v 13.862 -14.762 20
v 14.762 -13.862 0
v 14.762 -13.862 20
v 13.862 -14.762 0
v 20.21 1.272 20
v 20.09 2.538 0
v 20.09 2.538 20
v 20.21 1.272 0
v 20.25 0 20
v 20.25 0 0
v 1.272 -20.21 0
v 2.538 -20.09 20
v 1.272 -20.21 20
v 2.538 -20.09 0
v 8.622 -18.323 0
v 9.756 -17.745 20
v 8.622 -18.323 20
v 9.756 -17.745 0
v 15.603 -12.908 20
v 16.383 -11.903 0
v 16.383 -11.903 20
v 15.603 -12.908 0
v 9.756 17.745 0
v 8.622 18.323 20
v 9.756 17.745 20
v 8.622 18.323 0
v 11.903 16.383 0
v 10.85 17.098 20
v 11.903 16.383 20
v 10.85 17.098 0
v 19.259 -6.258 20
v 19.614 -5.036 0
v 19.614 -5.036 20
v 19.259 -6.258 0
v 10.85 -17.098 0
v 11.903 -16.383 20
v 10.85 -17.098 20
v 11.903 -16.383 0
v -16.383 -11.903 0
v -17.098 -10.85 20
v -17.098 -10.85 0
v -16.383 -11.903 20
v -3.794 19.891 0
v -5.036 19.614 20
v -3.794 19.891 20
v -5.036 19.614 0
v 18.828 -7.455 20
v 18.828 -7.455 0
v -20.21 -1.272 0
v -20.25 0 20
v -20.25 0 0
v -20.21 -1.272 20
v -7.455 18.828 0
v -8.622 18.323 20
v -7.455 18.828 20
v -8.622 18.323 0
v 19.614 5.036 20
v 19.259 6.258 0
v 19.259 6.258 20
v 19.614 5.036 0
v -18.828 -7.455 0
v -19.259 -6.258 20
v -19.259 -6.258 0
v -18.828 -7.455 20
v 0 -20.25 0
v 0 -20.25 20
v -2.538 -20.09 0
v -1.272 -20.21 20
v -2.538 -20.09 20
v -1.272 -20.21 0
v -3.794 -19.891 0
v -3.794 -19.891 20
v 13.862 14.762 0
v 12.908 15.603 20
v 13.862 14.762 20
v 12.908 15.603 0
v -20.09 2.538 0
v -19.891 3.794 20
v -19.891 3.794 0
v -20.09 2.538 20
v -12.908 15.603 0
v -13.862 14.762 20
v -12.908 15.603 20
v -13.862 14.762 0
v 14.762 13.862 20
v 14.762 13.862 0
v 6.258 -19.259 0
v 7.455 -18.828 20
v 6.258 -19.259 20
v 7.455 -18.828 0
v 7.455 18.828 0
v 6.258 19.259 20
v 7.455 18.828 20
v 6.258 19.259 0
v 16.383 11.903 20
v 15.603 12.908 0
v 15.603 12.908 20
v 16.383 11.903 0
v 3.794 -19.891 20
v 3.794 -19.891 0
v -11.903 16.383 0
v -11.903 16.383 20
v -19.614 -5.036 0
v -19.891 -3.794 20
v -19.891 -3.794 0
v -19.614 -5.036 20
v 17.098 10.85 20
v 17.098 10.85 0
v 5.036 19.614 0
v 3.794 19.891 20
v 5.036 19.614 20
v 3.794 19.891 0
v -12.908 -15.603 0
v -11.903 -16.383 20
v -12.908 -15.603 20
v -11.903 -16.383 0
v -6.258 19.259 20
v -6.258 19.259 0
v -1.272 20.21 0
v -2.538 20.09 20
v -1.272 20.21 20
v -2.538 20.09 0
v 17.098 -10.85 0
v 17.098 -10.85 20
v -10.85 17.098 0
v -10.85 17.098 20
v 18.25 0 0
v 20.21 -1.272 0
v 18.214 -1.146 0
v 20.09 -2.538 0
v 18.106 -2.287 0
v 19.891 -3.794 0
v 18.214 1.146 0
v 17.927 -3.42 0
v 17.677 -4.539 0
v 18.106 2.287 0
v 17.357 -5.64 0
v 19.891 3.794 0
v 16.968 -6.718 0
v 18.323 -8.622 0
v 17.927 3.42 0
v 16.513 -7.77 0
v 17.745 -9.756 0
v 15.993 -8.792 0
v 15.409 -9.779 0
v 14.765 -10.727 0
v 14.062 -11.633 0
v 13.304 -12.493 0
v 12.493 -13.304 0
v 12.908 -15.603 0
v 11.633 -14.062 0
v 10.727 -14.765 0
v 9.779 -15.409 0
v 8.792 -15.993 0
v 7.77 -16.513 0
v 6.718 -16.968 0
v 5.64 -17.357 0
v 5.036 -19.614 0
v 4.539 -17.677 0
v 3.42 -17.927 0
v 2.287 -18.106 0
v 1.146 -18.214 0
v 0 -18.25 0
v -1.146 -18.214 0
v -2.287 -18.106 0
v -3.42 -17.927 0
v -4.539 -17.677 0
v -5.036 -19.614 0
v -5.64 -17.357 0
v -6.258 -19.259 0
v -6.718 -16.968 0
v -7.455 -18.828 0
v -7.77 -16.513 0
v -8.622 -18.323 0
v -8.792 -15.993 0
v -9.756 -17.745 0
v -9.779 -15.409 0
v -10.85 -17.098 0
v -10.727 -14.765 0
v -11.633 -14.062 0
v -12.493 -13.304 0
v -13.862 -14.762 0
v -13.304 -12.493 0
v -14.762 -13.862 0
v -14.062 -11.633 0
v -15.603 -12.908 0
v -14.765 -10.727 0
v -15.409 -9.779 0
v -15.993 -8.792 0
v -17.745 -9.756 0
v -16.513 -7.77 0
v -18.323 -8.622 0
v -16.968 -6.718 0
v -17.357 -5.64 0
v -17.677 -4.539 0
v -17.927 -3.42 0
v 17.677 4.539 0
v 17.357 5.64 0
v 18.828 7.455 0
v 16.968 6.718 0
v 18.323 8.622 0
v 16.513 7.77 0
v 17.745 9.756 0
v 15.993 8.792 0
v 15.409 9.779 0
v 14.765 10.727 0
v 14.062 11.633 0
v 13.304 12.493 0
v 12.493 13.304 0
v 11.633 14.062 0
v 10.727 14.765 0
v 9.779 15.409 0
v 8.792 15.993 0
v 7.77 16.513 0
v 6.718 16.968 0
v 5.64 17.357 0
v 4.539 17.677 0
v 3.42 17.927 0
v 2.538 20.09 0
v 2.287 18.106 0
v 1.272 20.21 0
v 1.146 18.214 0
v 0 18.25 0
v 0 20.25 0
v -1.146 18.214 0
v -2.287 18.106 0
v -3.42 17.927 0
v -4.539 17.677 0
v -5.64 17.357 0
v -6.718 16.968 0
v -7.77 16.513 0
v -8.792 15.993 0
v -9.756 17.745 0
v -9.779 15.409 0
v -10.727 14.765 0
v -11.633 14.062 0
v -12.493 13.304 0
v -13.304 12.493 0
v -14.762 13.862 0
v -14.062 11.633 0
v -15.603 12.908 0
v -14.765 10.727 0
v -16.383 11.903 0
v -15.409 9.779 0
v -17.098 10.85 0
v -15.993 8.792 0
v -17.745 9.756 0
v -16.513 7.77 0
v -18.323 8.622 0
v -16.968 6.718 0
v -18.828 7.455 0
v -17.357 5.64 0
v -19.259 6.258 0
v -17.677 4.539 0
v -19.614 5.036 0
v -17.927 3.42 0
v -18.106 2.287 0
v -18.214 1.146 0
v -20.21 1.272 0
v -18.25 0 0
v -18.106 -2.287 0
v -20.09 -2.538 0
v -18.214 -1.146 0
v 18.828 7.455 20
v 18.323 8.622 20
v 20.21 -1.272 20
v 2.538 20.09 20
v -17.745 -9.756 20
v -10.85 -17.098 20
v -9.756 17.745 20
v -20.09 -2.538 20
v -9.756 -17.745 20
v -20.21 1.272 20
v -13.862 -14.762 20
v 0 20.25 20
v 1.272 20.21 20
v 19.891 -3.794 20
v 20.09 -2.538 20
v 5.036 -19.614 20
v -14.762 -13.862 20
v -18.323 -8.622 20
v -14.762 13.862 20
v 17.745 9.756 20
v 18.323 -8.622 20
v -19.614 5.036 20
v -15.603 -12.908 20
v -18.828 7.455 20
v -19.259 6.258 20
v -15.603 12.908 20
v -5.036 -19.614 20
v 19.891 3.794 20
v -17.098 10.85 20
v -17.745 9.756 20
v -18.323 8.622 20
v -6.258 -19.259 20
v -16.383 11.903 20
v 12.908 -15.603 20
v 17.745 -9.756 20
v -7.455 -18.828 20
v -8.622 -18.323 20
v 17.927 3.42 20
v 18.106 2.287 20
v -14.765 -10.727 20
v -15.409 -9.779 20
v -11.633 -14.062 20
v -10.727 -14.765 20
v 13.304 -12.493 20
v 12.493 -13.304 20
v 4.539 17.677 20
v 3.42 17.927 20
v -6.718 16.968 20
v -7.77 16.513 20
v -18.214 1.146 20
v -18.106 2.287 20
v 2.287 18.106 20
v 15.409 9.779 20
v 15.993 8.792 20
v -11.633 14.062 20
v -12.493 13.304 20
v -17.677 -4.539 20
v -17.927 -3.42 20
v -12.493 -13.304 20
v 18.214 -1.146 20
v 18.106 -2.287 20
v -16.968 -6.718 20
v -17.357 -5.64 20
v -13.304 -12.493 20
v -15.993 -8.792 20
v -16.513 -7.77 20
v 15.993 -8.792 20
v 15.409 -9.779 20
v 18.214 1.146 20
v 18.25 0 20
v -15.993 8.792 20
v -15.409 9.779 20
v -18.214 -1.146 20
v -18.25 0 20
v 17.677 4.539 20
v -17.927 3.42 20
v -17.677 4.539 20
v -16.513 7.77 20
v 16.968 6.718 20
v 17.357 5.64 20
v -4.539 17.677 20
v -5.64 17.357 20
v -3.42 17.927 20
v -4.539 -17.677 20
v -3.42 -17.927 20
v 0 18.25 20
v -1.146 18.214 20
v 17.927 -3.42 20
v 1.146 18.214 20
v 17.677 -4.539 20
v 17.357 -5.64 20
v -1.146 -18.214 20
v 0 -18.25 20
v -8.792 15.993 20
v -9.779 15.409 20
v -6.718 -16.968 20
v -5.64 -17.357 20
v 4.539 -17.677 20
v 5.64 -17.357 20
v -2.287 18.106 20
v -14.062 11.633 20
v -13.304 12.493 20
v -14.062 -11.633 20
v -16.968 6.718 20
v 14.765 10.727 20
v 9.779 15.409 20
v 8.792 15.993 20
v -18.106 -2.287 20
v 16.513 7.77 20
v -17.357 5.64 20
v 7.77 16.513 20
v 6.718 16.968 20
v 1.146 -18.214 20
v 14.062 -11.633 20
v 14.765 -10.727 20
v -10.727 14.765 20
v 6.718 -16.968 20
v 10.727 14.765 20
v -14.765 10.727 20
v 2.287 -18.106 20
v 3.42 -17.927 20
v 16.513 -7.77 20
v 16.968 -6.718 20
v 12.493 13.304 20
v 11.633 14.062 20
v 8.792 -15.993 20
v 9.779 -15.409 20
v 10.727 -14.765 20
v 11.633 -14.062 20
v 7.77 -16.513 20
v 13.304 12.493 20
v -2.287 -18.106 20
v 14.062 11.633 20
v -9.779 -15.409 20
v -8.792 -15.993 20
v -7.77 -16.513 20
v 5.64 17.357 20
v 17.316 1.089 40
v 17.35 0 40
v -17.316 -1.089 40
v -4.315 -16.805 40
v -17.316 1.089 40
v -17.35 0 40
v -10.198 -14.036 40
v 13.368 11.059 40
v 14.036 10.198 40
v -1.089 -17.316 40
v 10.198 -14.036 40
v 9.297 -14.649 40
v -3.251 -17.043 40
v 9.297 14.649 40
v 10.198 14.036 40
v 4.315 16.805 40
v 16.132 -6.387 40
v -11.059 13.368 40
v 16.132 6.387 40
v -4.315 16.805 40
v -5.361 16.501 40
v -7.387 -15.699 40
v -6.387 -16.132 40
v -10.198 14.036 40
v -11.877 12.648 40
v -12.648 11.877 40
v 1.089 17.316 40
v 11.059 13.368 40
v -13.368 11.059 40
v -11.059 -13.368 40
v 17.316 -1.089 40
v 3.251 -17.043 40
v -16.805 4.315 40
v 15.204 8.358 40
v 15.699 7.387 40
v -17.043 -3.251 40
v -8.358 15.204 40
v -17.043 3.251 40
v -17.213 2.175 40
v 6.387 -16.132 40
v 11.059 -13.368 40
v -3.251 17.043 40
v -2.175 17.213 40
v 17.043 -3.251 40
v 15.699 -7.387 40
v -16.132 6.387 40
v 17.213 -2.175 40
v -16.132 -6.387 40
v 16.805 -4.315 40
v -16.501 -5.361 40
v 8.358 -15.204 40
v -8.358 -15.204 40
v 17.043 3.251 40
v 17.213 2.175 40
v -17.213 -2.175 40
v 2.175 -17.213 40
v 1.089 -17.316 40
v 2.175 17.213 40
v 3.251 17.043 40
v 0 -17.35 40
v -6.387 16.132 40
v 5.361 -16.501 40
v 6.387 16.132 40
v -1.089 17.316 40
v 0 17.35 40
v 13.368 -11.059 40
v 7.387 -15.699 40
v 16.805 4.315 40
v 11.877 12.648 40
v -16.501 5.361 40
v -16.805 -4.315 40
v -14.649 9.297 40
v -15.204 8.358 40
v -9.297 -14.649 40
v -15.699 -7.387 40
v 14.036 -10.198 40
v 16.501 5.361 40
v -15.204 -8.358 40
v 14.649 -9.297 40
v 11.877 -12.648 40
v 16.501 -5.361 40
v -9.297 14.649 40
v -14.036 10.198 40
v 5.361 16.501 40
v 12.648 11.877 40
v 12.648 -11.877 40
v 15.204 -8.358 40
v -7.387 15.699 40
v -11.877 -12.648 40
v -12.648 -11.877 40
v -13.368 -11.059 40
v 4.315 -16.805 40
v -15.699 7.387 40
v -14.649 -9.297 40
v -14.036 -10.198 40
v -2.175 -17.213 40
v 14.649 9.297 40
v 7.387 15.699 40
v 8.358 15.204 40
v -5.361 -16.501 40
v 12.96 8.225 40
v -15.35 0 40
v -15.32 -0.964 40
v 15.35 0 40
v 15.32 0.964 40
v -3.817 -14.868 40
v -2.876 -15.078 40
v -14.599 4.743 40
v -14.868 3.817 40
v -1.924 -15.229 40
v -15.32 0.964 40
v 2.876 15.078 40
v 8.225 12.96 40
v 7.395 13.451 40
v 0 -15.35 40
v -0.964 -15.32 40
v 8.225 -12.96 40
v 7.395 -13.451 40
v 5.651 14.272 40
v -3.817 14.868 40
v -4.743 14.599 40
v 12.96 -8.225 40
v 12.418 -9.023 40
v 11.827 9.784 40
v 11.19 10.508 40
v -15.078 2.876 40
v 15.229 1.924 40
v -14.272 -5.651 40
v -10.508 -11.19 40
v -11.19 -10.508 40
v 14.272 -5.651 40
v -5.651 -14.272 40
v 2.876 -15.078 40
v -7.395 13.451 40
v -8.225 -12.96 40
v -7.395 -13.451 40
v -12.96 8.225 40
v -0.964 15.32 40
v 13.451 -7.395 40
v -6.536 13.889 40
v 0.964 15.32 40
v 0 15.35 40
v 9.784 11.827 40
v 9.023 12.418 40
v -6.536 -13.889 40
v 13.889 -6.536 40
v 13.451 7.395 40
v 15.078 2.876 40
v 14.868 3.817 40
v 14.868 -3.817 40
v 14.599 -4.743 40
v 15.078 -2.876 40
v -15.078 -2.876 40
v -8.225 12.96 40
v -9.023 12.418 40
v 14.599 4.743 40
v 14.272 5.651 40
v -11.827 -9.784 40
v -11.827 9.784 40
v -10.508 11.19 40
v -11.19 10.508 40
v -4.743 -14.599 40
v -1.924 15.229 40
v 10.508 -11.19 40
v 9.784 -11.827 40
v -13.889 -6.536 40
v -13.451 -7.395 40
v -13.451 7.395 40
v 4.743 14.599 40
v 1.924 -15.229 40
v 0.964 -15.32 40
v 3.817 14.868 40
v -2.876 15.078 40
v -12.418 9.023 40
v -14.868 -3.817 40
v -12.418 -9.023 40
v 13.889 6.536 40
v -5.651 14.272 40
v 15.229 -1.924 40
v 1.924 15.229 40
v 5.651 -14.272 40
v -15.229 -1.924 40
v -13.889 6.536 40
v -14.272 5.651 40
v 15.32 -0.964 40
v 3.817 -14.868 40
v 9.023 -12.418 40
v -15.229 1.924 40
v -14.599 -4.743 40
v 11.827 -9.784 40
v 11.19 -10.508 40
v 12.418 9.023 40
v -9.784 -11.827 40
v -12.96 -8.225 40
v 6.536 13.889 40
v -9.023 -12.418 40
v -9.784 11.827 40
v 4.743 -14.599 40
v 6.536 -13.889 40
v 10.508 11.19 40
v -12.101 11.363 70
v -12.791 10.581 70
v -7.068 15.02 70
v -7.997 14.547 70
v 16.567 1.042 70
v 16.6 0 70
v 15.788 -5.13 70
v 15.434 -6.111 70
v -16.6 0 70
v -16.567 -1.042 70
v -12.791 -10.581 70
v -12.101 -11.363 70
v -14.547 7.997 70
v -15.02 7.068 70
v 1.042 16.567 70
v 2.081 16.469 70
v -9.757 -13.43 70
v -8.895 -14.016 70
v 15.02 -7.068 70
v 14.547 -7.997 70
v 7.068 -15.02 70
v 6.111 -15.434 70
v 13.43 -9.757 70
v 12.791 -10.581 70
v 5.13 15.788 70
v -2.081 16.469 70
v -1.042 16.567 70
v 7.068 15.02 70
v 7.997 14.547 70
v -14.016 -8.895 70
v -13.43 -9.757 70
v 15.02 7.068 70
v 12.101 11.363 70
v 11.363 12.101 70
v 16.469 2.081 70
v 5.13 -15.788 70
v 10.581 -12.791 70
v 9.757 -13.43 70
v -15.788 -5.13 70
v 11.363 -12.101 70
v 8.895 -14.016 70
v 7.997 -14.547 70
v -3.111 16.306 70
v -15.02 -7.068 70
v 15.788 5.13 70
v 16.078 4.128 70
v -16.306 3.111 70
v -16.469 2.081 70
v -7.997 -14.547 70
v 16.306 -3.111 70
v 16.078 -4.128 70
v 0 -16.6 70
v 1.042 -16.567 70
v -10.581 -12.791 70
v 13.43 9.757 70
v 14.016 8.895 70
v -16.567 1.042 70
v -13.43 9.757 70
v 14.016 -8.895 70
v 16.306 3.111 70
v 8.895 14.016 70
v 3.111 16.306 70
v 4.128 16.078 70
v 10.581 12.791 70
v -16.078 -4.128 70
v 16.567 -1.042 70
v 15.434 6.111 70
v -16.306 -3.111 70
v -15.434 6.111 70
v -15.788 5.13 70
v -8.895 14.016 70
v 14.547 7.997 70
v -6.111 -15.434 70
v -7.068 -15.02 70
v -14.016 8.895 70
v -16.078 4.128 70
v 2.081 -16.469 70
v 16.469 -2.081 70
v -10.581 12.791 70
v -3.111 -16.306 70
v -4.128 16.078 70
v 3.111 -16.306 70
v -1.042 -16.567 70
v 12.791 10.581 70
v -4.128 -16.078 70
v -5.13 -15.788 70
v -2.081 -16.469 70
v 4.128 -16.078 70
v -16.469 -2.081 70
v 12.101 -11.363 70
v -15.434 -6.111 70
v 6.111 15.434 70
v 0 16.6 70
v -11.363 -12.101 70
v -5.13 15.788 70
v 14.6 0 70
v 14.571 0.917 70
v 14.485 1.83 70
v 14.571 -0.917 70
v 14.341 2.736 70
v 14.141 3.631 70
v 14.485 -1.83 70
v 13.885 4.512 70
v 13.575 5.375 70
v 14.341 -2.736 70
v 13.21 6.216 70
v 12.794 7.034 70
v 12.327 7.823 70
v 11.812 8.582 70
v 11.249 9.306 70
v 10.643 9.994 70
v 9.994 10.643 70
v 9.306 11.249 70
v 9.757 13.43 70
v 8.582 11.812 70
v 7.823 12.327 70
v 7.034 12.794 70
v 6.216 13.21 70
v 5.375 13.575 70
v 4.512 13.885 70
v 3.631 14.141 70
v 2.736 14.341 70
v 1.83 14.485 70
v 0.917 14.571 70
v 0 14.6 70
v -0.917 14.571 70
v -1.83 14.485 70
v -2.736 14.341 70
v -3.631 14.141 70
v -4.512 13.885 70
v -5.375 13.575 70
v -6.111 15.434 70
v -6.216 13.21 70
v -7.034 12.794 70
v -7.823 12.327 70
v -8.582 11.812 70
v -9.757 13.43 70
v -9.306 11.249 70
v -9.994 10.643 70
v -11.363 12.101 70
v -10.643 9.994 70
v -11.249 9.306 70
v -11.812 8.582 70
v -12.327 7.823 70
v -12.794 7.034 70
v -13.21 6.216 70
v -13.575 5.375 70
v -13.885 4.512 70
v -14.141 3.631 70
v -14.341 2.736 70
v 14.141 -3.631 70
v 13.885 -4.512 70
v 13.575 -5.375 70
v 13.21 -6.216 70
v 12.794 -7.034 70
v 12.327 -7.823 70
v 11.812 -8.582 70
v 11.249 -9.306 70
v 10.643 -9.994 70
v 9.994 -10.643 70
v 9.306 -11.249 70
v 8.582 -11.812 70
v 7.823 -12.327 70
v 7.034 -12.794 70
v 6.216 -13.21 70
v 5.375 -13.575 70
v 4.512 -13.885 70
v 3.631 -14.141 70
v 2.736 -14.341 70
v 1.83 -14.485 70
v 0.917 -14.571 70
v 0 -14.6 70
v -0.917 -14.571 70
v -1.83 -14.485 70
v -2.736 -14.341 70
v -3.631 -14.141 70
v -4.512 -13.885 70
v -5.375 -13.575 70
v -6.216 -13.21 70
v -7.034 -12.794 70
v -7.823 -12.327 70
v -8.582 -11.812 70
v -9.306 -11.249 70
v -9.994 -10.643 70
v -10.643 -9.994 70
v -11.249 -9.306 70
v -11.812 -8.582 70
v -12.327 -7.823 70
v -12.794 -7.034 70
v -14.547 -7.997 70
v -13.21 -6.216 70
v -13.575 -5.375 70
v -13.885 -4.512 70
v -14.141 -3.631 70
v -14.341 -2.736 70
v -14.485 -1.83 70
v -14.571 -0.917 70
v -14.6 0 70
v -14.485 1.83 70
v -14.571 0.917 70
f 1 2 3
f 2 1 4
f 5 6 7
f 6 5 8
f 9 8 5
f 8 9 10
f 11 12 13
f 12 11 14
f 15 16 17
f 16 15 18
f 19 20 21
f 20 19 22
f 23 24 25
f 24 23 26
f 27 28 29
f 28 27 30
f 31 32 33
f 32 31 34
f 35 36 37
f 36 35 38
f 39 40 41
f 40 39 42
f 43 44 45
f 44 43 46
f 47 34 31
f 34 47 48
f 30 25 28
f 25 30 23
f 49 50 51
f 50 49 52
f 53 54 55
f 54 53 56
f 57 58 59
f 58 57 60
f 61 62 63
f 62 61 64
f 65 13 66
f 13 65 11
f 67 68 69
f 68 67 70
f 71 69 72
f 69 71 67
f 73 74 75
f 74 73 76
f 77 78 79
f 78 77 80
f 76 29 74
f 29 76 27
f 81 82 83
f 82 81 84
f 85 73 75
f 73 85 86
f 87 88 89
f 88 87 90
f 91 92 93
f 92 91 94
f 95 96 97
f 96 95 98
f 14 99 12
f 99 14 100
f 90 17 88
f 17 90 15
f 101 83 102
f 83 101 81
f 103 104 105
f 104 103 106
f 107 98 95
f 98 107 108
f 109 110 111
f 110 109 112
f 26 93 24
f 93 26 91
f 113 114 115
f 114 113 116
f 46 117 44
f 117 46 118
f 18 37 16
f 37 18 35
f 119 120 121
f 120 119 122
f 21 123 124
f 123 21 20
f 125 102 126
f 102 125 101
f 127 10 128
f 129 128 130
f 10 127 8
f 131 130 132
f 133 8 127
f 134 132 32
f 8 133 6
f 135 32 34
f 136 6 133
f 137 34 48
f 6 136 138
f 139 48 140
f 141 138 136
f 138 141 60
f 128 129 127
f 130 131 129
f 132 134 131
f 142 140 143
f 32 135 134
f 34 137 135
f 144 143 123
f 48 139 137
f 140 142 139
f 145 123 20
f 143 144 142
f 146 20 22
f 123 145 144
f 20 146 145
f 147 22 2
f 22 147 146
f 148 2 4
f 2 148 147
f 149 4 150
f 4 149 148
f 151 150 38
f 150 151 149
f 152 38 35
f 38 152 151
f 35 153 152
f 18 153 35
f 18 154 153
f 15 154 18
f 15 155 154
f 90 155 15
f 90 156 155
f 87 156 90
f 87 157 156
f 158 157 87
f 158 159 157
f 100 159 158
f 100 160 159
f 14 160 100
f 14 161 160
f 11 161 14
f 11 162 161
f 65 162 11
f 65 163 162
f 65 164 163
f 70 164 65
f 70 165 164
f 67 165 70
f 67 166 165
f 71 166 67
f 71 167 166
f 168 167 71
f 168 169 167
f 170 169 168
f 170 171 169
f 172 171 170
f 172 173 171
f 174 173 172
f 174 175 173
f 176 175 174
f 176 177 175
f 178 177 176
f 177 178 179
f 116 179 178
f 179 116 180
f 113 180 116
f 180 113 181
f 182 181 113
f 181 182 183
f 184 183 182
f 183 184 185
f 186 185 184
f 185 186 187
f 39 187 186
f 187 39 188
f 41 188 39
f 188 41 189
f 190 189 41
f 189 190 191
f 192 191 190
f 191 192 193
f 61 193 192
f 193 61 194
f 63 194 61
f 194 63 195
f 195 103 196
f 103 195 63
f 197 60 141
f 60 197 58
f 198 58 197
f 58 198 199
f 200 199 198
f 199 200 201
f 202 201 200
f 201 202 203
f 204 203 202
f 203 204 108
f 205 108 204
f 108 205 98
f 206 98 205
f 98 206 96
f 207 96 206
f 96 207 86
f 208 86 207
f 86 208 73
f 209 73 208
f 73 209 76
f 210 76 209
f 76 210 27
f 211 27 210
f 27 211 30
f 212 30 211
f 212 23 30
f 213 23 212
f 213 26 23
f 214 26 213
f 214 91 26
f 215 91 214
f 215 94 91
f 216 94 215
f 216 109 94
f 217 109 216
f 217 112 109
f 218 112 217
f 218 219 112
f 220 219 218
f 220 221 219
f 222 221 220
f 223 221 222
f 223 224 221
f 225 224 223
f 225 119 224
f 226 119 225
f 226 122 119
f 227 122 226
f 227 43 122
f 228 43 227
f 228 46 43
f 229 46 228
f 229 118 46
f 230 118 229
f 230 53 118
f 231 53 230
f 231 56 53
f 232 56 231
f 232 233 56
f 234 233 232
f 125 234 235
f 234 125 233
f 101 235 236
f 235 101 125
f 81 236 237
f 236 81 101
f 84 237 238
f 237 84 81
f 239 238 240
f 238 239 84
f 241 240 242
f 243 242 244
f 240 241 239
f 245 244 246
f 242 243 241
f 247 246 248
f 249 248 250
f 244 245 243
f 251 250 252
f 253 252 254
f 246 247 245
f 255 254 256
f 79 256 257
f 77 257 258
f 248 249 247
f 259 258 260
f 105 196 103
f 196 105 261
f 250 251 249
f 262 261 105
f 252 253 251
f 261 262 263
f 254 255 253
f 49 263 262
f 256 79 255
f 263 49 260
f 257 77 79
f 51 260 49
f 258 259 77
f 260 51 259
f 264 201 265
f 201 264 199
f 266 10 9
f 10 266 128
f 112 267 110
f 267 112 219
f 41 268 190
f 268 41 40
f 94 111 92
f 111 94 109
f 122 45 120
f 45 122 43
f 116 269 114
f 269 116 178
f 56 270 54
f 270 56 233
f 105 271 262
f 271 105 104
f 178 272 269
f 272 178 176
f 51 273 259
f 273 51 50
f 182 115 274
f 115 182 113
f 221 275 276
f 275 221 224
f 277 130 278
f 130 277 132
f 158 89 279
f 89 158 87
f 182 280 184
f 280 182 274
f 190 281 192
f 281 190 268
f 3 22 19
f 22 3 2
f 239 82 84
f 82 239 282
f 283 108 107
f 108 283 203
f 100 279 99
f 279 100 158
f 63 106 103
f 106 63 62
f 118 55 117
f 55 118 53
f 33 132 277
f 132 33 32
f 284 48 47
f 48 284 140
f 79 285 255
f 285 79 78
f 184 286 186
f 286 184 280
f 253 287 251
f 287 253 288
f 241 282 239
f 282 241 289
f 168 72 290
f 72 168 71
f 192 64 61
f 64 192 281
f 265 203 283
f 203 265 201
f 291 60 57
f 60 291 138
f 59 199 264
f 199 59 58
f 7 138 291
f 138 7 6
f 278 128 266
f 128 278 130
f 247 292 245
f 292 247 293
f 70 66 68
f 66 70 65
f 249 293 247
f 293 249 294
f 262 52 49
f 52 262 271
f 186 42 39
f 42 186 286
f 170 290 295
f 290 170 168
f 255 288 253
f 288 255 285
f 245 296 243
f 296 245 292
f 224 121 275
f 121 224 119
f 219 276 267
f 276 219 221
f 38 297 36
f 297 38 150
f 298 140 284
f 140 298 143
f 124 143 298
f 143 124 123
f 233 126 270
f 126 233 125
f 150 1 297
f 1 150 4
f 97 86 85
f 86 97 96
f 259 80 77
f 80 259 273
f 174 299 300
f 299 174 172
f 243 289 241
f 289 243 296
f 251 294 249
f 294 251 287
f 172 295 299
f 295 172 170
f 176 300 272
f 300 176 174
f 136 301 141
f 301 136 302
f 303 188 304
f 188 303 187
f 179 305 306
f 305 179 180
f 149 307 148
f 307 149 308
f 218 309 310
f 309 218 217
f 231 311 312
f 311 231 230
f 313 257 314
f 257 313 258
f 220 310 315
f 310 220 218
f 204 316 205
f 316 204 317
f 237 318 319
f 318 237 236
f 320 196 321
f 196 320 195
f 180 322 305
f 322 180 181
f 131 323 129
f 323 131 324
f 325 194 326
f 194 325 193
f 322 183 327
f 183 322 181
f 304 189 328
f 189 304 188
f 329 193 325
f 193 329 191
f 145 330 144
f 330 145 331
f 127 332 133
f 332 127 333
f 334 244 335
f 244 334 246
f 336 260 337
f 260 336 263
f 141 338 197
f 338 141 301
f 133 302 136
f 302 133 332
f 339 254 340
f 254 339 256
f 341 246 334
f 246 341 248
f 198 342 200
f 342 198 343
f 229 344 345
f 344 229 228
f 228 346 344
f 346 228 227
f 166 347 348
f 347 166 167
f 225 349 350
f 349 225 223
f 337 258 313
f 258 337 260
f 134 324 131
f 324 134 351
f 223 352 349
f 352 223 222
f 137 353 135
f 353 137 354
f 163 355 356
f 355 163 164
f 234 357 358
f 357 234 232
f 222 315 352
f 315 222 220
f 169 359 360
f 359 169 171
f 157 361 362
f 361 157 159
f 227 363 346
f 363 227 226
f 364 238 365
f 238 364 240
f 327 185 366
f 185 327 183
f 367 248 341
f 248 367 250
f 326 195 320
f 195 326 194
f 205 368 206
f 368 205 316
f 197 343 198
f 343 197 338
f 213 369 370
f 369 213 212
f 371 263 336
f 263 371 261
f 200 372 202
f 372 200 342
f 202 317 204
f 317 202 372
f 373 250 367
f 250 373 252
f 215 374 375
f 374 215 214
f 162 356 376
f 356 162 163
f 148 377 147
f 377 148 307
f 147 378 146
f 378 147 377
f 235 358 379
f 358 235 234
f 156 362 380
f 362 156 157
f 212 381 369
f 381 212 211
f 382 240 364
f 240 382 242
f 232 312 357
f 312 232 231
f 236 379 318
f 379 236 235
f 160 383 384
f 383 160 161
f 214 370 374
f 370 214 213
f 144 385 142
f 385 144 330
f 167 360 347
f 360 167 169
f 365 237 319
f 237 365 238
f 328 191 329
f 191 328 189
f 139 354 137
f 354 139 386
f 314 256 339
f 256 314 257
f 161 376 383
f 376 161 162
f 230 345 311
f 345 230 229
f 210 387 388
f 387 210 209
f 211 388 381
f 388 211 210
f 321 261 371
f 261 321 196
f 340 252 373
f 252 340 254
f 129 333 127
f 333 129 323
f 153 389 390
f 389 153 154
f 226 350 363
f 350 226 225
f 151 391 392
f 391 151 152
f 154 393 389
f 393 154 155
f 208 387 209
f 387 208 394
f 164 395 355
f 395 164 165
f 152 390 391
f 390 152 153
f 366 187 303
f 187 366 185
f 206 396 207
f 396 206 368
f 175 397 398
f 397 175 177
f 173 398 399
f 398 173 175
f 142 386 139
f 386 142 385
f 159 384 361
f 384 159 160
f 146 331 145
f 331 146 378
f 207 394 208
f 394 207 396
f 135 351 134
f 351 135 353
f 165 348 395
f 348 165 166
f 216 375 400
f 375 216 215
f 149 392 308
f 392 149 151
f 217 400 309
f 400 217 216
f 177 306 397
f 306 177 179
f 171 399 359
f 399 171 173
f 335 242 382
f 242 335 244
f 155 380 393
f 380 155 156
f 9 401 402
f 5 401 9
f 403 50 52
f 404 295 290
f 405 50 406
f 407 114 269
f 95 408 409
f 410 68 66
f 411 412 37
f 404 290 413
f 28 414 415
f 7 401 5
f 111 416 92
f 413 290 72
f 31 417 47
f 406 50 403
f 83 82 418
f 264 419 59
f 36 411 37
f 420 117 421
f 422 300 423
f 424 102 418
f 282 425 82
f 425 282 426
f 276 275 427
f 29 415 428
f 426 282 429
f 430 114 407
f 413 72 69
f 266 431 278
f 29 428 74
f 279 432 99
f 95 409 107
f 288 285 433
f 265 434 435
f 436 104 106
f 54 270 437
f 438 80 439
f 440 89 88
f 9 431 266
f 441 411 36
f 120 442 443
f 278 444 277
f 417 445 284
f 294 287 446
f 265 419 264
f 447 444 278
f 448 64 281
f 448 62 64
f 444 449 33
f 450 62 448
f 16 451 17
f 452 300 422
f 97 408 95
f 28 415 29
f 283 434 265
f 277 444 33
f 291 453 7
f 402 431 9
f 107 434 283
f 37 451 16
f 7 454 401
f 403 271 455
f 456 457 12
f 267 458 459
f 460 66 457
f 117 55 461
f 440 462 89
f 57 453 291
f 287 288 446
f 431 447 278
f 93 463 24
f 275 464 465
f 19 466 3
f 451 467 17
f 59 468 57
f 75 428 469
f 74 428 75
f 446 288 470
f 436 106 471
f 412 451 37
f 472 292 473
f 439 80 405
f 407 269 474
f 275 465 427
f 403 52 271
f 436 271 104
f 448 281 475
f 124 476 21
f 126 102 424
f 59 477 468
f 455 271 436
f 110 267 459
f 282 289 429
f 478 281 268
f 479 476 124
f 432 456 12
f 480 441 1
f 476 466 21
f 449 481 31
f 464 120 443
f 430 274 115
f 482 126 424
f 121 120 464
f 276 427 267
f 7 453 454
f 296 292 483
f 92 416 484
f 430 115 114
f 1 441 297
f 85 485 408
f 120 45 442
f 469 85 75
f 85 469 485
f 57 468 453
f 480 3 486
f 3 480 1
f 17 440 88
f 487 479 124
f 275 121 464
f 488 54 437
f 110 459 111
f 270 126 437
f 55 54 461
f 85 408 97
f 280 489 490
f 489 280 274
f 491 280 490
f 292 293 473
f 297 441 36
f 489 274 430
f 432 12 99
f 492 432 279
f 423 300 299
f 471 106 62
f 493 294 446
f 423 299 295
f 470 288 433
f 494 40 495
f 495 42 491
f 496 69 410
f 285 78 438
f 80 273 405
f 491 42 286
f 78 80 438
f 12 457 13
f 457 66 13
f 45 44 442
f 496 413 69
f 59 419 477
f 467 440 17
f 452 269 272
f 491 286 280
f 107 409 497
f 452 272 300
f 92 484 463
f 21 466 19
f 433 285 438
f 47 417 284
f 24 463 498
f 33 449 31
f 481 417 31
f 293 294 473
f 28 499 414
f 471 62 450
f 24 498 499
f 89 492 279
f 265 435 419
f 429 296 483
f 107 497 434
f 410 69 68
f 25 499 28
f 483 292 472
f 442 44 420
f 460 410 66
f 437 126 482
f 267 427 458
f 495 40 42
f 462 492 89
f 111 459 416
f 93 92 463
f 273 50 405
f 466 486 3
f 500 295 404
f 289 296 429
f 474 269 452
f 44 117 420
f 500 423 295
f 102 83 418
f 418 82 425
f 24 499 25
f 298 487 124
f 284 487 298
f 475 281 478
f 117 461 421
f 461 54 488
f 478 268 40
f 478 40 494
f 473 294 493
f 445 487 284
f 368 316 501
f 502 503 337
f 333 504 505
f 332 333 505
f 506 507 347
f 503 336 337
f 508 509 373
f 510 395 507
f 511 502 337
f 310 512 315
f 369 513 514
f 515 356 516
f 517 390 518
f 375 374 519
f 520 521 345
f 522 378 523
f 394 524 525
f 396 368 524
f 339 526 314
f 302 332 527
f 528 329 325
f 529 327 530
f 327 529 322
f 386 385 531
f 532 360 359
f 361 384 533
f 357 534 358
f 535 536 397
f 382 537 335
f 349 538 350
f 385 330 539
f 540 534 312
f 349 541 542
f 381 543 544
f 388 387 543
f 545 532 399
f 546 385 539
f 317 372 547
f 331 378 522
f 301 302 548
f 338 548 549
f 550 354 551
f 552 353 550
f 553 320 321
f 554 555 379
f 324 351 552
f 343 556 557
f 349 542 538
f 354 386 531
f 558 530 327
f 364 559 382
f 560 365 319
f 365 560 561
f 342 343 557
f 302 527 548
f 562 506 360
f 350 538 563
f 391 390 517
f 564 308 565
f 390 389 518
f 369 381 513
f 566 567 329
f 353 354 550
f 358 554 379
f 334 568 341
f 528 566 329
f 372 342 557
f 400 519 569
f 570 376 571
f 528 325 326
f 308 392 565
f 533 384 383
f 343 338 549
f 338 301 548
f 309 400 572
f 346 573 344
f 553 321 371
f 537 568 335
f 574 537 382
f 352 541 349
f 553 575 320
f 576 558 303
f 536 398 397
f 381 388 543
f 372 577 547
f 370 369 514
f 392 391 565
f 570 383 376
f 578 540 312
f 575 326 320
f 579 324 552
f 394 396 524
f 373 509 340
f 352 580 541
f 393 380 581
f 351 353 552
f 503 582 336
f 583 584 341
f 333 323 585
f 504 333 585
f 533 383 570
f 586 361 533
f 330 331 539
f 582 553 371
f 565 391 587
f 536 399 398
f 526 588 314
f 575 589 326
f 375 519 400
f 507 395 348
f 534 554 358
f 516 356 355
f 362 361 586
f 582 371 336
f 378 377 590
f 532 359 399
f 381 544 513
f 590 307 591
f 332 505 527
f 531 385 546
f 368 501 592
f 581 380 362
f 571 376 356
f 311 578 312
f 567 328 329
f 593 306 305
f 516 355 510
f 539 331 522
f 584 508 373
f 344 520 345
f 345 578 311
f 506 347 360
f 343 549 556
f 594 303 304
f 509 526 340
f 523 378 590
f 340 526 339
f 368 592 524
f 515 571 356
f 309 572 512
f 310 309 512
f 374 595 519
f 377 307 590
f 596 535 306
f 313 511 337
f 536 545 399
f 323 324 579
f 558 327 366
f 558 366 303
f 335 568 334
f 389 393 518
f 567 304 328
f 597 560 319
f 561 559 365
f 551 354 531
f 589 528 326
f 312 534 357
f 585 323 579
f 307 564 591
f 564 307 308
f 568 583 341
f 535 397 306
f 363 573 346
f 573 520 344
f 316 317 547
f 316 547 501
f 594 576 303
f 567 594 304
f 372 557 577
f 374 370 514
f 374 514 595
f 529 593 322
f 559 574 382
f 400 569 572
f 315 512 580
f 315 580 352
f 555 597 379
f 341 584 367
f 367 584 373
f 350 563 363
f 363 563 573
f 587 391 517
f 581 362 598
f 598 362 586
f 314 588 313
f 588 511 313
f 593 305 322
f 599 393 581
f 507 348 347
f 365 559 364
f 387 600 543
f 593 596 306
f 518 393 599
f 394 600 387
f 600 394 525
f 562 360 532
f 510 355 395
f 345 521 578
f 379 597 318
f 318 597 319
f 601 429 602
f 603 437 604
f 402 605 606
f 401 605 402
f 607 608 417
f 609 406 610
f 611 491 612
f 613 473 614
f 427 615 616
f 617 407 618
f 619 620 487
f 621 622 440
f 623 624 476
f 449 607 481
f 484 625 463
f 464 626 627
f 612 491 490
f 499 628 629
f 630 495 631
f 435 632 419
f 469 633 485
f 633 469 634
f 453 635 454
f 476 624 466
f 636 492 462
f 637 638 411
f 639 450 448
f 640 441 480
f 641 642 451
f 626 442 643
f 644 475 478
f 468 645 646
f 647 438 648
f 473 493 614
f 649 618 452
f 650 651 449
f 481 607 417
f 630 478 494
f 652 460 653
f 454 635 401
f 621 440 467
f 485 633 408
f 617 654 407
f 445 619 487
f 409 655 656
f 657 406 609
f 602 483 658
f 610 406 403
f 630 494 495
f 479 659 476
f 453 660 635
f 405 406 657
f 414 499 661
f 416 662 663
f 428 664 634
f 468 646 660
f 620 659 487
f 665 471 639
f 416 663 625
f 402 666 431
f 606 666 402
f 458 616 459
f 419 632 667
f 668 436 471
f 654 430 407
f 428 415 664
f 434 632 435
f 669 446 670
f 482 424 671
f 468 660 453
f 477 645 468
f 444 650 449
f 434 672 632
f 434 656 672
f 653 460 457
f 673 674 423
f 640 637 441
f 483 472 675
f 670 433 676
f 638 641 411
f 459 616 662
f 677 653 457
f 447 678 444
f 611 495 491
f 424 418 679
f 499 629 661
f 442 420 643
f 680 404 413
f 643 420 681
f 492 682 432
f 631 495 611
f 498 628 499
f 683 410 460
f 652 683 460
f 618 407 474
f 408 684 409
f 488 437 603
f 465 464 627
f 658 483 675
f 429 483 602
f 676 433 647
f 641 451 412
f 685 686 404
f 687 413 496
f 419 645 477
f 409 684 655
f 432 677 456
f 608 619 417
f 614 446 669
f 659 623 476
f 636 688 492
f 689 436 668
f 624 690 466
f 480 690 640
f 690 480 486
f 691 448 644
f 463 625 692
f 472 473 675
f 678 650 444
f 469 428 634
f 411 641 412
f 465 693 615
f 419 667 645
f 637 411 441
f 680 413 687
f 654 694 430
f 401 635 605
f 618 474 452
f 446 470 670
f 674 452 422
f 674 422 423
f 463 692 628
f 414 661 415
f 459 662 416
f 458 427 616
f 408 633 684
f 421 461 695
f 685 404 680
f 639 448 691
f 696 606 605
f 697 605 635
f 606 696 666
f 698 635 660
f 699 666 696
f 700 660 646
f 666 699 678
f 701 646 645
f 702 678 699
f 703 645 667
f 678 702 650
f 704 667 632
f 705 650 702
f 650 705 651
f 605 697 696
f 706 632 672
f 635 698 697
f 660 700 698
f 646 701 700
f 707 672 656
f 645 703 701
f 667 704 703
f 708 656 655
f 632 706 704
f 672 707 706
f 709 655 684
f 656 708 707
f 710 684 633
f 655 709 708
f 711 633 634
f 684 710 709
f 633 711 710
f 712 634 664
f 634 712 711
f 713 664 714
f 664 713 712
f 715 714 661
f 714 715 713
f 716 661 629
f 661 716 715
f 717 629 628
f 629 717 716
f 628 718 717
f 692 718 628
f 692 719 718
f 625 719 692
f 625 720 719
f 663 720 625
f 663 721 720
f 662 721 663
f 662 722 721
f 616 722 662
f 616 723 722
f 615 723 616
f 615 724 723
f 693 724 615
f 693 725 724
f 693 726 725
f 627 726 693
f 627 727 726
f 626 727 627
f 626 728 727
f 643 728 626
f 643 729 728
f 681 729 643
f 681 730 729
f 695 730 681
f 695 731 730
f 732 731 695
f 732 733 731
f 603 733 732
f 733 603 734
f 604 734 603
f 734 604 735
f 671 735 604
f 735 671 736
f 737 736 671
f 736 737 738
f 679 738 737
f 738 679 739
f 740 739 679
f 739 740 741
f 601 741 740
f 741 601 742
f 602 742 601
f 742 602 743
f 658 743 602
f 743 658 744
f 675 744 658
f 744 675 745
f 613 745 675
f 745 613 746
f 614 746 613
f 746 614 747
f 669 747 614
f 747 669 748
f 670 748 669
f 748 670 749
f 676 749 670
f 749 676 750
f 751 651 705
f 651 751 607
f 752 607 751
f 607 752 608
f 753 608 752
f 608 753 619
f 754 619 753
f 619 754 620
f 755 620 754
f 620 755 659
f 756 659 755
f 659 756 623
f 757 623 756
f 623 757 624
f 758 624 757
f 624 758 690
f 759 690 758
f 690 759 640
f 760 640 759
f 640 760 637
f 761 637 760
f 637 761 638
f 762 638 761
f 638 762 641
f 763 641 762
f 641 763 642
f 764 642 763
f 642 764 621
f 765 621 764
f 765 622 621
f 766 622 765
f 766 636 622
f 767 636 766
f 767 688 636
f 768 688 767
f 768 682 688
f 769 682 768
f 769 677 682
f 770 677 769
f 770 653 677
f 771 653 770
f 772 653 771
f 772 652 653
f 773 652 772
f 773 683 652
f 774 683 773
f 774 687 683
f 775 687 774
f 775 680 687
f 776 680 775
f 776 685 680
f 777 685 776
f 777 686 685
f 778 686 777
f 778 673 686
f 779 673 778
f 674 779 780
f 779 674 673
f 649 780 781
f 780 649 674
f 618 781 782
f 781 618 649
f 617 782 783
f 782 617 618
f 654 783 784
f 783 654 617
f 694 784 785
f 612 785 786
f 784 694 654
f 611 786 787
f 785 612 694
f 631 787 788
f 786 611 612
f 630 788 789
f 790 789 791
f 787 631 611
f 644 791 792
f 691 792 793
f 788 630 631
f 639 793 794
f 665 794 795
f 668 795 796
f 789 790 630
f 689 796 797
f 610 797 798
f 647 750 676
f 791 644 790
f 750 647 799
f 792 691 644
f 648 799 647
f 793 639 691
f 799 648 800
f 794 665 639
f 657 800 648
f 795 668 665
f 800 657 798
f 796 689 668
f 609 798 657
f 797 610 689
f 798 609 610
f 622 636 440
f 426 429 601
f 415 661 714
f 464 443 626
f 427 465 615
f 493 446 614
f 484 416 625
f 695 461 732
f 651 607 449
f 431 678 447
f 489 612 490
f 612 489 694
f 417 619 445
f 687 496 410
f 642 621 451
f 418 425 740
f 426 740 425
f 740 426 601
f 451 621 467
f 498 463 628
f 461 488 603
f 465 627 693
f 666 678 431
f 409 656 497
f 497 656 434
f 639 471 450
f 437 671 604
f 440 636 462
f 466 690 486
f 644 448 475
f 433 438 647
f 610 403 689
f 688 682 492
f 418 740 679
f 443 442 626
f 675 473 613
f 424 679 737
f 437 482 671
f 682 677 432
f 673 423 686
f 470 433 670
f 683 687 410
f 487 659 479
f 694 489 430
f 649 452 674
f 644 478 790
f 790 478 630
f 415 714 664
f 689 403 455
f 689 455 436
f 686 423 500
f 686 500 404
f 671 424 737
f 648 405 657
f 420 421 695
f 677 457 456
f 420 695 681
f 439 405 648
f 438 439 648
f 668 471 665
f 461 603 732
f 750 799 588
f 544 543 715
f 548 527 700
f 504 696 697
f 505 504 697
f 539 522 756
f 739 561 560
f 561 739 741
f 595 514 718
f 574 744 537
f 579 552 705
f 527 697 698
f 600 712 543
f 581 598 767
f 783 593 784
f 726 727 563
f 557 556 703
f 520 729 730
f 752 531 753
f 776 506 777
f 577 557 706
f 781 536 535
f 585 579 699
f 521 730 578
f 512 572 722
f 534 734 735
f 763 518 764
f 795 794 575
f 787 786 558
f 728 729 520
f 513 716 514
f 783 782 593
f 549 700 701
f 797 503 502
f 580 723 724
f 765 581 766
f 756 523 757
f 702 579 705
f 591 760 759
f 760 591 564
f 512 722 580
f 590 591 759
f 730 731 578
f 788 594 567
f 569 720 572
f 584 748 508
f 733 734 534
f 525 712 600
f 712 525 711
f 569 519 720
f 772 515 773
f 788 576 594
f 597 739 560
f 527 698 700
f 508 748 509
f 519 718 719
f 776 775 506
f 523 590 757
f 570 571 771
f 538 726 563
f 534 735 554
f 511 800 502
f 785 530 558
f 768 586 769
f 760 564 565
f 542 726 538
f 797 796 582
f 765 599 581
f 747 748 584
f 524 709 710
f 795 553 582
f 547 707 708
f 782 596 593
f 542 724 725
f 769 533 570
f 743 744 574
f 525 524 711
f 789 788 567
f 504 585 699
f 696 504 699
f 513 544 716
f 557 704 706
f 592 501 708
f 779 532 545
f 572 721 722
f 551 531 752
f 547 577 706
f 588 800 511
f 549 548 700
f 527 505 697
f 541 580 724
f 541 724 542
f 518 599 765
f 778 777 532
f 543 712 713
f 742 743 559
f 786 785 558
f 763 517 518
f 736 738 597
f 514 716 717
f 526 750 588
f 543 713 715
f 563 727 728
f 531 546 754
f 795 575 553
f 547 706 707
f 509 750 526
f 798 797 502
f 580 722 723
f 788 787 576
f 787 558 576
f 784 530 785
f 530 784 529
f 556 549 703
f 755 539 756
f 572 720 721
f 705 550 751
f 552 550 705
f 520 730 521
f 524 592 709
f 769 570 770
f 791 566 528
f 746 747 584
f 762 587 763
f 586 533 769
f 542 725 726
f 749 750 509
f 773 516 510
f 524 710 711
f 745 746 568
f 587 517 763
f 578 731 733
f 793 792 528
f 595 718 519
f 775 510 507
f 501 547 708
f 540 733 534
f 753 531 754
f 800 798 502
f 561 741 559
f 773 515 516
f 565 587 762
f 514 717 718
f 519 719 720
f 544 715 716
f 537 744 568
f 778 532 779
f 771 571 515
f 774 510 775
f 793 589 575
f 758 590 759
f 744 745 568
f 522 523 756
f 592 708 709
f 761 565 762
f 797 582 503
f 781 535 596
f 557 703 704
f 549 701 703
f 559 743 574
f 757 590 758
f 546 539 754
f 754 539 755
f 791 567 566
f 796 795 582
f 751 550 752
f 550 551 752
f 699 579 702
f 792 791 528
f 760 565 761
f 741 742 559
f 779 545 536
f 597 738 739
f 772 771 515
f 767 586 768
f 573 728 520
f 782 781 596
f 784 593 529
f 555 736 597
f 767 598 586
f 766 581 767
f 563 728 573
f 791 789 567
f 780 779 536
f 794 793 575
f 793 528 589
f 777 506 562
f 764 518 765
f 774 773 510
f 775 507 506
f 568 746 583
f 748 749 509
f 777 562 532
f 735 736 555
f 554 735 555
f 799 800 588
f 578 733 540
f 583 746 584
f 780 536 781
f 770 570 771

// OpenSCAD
$fn=100;
wall_thickness = 2;
section_length = 20;
end_taper = 1.5;

start_int_dia = 36.5;
start_ext_dia = start_int_dia + 2 * wall_thickness;

end_ext_dia = 34.7;
end_int_dia = end_ext_dia - 2 * wall_thickness;


module start_tube() {
    difference() {
        cylinder(section_length, d = start_ext_dia);
        cylinder(section_length, d = start_int_dia);
    }
}

module middle_tube() {
    difference() {
        cylinder(section_length, d1 = start_ext_dia, d2 = end_ext_dia);
        cylinder(section_length, d1 = start_int_dia, d2 = end_int_dia);
    }
}

module end_tube() {
    difference() {
        cylinder(section_length*1.5, d1 = end_ext_dia, d2 = end_ext_dia-end_taper);
        cylinder(section_length*1.5, d1 = end_int_dia, d2 = end_int_dia-end_taper);
    }
}

module adaptor() {
    start_tube();
    translate([0, 0, section_length]) middle_tube();
    translate([0, 0, section_length*2]) end_tube();    
}


adaptor();
    
    
